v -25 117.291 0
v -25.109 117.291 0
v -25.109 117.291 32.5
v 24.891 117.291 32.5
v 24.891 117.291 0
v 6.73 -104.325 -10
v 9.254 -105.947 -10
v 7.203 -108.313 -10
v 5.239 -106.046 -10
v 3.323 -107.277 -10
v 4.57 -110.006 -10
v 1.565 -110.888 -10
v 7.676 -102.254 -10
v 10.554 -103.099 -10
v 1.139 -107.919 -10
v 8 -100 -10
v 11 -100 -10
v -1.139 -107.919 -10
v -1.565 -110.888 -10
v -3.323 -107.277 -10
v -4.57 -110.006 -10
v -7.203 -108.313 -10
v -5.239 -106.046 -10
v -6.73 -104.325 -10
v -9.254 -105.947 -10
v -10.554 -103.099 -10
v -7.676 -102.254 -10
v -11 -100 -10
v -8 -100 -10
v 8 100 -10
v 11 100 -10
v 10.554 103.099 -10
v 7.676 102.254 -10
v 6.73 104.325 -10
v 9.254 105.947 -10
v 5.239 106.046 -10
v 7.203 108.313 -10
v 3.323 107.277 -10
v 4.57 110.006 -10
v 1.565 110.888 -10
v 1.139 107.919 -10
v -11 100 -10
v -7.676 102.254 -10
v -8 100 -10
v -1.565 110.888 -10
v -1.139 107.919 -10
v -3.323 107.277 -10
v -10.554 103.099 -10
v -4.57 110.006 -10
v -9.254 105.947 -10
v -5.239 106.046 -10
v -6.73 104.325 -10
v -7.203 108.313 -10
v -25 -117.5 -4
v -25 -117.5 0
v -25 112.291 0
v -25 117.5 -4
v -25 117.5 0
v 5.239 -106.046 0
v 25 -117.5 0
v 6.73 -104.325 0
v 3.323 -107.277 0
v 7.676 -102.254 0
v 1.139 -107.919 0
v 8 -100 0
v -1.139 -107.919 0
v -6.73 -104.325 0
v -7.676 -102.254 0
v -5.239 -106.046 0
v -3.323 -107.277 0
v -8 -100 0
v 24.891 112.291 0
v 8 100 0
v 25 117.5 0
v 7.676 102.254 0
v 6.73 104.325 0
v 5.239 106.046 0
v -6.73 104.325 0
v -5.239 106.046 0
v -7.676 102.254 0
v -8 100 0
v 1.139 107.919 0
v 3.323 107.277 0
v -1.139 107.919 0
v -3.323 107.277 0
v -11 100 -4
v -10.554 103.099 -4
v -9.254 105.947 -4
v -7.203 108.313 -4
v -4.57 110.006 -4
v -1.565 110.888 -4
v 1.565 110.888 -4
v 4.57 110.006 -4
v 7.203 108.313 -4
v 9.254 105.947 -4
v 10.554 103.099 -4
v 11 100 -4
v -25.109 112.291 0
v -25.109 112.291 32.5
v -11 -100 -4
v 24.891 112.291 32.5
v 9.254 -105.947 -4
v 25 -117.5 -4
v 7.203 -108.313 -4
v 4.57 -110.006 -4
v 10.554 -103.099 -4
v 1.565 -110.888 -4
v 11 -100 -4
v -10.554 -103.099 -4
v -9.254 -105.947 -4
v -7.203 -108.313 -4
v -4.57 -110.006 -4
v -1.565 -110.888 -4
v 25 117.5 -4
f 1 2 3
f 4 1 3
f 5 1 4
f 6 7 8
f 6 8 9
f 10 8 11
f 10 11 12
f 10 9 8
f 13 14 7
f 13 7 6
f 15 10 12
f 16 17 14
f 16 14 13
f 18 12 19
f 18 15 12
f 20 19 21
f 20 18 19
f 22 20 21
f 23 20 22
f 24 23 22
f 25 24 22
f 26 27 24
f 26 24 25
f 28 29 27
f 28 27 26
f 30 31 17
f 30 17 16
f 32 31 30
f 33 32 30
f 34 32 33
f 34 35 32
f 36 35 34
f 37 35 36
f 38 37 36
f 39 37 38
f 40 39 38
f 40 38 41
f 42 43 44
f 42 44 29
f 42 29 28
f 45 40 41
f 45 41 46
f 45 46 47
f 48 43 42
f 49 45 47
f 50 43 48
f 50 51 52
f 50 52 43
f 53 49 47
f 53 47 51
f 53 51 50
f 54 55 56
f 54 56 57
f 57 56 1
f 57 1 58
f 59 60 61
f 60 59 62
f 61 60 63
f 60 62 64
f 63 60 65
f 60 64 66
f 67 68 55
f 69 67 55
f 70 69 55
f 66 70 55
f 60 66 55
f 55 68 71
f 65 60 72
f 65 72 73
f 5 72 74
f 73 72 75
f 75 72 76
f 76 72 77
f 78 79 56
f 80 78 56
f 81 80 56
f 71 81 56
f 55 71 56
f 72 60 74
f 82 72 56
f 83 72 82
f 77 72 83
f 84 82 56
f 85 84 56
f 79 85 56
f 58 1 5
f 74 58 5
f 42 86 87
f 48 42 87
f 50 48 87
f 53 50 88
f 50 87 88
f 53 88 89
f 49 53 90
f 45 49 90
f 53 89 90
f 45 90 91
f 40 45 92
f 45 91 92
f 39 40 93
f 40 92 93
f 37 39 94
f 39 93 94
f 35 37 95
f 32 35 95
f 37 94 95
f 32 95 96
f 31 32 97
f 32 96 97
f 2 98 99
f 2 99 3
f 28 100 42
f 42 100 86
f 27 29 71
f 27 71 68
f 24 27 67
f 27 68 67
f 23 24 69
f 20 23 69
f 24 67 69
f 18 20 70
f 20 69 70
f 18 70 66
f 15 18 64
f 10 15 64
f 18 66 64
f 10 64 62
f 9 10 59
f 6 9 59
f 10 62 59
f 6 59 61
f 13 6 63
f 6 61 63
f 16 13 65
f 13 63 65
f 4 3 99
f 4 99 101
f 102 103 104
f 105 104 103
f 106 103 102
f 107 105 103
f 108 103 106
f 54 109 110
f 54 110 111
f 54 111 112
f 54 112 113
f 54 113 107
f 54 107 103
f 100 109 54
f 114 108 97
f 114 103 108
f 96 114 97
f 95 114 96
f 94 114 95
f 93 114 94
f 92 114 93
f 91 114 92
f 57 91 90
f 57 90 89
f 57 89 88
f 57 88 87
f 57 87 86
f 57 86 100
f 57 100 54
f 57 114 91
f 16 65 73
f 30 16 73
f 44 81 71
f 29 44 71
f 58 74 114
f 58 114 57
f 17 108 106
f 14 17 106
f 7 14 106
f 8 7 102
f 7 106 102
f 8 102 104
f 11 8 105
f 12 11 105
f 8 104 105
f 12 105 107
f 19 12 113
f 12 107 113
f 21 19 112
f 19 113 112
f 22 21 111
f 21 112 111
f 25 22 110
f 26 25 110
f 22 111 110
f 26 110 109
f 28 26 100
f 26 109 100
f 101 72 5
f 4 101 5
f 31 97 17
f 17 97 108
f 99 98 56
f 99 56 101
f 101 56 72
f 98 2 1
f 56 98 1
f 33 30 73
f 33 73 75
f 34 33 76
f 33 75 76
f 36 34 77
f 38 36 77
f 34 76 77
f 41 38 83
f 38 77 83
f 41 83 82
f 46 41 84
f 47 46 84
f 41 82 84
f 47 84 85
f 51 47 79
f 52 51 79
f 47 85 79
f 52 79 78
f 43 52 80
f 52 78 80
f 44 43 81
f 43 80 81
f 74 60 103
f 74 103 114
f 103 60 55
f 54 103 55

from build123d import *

# Parameters (mm, degrees)
F0_W     = 50
F0_H     = 235
F1_DEPTH = 4
F2_DEPTH = 10
F3_ANGLE = 180
F5_W     = 50
F5_H     = 5
F6_DEPTH = 32.5


with BuildPart() as f1:
    # F0 (on Top) → F1 (new body)
    with BuildSketch(Plane.XY):
        Rectangle(F0_W, F0_H)
        with BuildLine():
            Line((11, 100), (11, -100))
            ThreePointArc((11, -100), (0, -111), (-11, -100))
            Line((-11, -100), (-11, 100))
            ThreePointArc((-11, 100), (0, 111), (11, 100))
        make_face(mode=Mode.SUBTRACT)
    extrude(amount=F1_DEPTH)

    # F0 (on Top) → F2 (join)
    with BuildSketch(Plane.XY):
        with BuildLine():
            ThreePointArc((-11, -100), (0, -111), (11, -100))
            Line((11, -100), (11, 100))
            ThreePointArc((11, 100), (0, 111), (-11, 100))
            Line((-11, 100), (-11, -100))
        make_face()
        with BuildLine():
            Line((8, 100), (8, -100))
            ThreePointArc((8, -100), (0, -108), (-8, -100))
            Line((-8, -100), (-8, 100))
            ThreePointArc((-8, 100), (0, 108), (8, 100))
        make_face(mode=Mode.SUBTRACT)
    extrude(amount=F2_DEPTH)


with BuildPart() as f1_1:
    # F3: moved
    add(f1.part.rotate(Axis((-8, 0, 0), (0, 1, 0)), F3_ANGLE))


with BuildPart() as f1_2:
    # F4: moved
    add(f1_1.part.moved(Location((16, 0, 0))))

    # F5 (on face) → F6 (join)
    with BuildSketch(Plane.XY):
        with Locations((-0.108881, 114.791463)):
            Rectangle(F5_W, F5_H)
    extrude(amount=F6_DEPTH)


solid = f1_2.part
